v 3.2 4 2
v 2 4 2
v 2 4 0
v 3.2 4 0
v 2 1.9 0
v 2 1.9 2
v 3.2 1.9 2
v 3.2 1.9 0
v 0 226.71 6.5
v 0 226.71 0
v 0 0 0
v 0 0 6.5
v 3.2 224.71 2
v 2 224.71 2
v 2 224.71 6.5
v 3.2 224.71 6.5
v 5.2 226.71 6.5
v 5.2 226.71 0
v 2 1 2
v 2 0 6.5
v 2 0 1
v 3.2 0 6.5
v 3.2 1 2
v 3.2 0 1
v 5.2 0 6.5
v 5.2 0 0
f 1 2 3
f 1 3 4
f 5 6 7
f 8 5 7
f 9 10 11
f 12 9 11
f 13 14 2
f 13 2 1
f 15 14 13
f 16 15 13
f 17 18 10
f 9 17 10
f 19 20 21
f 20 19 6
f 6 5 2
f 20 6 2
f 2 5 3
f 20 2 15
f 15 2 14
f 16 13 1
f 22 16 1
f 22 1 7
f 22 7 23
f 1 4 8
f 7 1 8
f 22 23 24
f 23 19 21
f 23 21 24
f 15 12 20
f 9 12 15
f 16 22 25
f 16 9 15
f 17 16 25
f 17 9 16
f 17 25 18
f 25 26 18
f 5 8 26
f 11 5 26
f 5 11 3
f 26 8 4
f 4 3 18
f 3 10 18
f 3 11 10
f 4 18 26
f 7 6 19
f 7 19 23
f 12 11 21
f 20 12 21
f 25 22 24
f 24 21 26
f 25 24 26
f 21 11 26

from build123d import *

# Parameters (mm, degrees)
F0_W     = 5.2
F0_H     = 226.71
F1_DEPTH = 2
F3_DEPTH = 4.5
F4_W     = 1.2
F4_H     = 2.1
F5_DEPTH = 25
F6_SIZE  = 1


with BuildPart() as f1:
    # F0 (on Top) → F1 (new body)
    with BuildSketch(Plane.XY):
        with Locations((2.6, 113.355)):
            Rectangle(F0_W, F0_H)
    extrude(amount=F1_DEPTH)

    # F2 (on face) → F3 (join)
    with BuildSketch(Plane.XY.offset(2)):
        Polygon((0, 226.71), (0, 0), (2, 0), (2, 224.71), (3.2, 224.71), (3.2, 0), (5.2, 0), (5.2, 226.71), align=None)
    extrude(amount=F3_DEPTH)

    # F4 (on face) → F5 (cut)
    with BuildSketch(Plane.XY.offset(2)):
        with Locations((2.6, 2.95)):
            Rectangle(F4_W, F4_H)
    extrude(amount=-F5_DEPTH, mode=Mode.SUBTRACT)

    # F6
    f6_edges = [f1.edges().sort_by_distance(p)[0] for p in [
        (2.6, 0, 2),
    ]]
    chamfer(f6_edges, length=F6_SIZE)


solid = f1.part
